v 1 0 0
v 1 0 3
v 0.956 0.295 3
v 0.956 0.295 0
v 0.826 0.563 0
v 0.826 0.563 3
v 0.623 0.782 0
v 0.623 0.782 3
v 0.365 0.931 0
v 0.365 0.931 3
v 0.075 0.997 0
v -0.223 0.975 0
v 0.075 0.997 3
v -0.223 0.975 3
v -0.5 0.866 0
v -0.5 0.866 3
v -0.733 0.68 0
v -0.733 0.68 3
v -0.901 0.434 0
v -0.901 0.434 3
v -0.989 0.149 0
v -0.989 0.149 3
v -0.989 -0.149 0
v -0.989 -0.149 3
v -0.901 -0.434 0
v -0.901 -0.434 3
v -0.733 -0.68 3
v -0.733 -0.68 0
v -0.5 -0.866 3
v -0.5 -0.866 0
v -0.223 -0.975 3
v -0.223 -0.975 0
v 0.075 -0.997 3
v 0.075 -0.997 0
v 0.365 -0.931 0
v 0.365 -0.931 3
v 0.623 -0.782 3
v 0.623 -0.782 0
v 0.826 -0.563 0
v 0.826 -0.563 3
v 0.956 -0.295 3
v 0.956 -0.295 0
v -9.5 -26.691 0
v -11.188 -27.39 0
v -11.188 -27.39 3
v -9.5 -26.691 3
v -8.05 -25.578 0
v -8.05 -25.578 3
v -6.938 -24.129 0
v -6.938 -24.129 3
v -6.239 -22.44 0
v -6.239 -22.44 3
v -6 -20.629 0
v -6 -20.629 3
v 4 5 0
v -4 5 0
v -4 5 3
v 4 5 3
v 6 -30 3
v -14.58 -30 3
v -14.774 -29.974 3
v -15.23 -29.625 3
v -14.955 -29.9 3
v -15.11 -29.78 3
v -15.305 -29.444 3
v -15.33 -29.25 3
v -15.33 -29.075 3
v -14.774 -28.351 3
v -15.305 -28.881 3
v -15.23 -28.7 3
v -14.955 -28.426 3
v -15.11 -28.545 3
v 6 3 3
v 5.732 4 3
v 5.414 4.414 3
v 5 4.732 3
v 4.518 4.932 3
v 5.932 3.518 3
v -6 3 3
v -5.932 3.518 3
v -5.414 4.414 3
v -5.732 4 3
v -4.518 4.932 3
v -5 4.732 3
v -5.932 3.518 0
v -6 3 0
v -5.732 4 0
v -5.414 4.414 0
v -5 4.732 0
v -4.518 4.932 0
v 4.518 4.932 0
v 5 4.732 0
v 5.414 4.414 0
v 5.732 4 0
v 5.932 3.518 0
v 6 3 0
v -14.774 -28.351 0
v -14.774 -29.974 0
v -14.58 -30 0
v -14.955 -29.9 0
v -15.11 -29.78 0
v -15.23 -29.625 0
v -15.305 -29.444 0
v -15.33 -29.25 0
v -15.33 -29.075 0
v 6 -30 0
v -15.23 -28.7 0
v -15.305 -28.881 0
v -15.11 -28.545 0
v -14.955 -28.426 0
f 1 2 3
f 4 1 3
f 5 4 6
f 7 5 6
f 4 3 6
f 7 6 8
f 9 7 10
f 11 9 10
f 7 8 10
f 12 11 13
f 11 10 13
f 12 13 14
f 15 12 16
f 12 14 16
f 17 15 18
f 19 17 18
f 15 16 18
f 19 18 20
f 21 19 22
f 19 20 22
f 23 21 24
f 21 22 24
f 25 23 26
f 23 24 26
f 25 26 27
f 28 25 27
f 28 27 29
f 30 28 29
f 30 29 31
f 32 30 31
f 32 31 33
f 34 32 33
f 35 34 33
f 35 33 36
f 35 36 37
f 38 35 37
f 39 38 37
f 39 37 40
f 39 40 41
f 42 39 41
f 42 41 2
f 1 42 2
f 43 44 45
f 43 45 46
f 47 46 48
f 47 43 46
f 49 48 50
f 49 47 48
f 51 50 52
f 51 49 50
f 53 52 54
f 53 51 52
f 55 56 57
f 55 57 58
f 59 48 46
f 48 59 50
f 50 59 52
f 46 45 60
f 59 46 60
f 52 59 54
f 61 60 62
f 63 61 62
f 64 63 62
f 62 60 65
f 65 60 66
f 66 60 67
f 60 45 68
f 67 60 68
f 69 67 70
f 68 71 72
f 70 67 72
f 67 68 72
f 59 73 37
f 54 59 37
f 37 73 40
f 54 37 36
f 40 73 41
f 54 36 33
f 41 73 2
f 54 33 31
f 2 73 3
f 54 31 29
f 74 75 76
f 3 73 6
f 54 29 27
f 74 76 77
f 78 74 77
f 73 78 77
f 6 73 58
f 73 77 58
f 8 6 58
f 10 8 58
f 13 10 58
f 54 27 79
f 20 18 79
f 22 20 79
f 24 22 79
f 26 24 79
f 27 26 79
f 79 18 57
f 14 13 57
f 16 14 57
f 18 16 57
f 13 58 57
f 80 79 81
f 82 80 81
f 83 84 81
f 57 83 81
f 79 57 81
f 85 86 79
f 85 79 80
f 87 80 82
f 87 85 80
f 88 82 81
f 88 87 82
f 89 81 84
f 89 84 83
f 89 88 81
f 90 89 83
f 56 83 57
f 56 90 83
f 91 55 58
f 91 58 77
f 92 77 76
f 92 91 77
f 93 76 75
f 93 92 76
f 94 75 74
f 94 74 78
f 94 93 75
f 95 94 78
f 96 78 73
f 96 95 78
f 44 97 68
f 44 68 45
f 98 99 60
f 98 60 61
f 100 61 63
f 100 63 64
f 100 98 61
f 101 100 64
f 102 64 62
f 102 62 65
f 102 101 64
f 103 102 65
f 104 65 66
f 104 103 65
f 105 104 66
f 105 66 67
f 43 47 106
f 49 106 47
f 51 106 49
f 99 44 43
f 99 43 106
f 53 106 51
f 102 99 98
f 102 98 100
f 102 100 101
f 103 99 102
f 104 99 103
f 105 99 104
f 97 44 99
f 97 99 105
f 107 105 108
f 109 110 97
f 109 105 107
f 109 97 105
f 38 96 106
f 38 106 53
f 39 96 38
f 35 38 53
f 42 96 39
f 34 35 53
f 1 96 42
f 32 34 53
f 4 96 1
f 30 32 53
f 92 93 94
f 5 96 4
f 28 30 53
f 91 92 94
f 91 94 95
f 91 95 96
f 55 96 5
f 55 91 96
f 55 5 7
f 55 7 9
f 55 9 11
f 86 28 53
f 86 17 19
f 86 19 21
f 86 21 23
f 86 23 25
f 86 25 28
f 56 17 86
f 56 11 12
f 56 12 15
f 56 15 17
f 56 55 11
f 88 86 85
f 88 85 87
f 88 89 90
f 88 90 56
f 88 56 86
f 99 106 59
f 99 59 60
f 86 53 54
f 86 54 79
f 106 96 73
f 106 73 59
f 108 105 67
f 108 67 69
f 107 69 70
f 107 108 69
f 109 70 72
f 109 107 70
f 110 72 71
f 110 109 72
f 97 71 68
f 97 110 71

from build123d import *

# Parameters (mm, degrees)
BOSS_EXTRUDE1_DEPTH     = 3
SKETCH2_R               = 1
CUT_EXTRUDE1_DEPTH      = 1
CUT_EXTRUDE1_DEPTH_BACK = 4


with BuildPart() as part:
    # Sketch1 → Boss-Extrude1 (new body)
    with BuildSketch(Plane.XY):
        with BuildLine():
            Line((-6, -30), (-14.580127019, -30))
            ThreePointArc((-14.580127019, -30), (-15.110457105, -29.780330086), (-15.330127019, -29.25))
            Line((-15.330127019, -29.25), (-15.330127019, -29.075495241))
            ThreePointArc((-15.330127019, -29.075495241), (-15.175142024, -28.618924169), (-14.774241303, -28.351050871))
            Line((-14.774241303, -28.351050871), (-11.188266684, -27.390191868))
            ThreePointArc((-11.188266684, -27.390191868), (-7.446526618, -24.890041087), (-6, -20.628711084))
            Line((-6, -20.628711084), (-6, 0))
            Line((-6, 0), (-6, 3))
            ThreePointArc((-6, 3), (-5.414213562, 4.414213562), (-4, 5))
            Line((-4, 5), (4, 5))
            ThreePointArc((4, 5), (5.414213562, 4.414213562), (6, 3))
            Line((6, 3), (6, 0))
            Line((6, 0), (6, -30))
            Line((6, -30), (-6, -30))
        make_face()
    extrude(amount=BOSS_EXTRUDE1_DEPTH)

    # Sketch2 → Cut-Extrude1 (cut, two sides)
    with BuildSketch(Plane.XY.offset(3)) as cut_extrude1_sk:
        Circle(SKETCH2_R)
    extrude(amount=CUT_EXTRUDE1_DEPTH, mode=Mode.SUBTRACT)
    extrude(cut_extrude1_sk.sketch, amount=-CUT_EXTRUDE1_DEPTH_BACK, mode=Mode.SUBTRACT)


solid = part.part
